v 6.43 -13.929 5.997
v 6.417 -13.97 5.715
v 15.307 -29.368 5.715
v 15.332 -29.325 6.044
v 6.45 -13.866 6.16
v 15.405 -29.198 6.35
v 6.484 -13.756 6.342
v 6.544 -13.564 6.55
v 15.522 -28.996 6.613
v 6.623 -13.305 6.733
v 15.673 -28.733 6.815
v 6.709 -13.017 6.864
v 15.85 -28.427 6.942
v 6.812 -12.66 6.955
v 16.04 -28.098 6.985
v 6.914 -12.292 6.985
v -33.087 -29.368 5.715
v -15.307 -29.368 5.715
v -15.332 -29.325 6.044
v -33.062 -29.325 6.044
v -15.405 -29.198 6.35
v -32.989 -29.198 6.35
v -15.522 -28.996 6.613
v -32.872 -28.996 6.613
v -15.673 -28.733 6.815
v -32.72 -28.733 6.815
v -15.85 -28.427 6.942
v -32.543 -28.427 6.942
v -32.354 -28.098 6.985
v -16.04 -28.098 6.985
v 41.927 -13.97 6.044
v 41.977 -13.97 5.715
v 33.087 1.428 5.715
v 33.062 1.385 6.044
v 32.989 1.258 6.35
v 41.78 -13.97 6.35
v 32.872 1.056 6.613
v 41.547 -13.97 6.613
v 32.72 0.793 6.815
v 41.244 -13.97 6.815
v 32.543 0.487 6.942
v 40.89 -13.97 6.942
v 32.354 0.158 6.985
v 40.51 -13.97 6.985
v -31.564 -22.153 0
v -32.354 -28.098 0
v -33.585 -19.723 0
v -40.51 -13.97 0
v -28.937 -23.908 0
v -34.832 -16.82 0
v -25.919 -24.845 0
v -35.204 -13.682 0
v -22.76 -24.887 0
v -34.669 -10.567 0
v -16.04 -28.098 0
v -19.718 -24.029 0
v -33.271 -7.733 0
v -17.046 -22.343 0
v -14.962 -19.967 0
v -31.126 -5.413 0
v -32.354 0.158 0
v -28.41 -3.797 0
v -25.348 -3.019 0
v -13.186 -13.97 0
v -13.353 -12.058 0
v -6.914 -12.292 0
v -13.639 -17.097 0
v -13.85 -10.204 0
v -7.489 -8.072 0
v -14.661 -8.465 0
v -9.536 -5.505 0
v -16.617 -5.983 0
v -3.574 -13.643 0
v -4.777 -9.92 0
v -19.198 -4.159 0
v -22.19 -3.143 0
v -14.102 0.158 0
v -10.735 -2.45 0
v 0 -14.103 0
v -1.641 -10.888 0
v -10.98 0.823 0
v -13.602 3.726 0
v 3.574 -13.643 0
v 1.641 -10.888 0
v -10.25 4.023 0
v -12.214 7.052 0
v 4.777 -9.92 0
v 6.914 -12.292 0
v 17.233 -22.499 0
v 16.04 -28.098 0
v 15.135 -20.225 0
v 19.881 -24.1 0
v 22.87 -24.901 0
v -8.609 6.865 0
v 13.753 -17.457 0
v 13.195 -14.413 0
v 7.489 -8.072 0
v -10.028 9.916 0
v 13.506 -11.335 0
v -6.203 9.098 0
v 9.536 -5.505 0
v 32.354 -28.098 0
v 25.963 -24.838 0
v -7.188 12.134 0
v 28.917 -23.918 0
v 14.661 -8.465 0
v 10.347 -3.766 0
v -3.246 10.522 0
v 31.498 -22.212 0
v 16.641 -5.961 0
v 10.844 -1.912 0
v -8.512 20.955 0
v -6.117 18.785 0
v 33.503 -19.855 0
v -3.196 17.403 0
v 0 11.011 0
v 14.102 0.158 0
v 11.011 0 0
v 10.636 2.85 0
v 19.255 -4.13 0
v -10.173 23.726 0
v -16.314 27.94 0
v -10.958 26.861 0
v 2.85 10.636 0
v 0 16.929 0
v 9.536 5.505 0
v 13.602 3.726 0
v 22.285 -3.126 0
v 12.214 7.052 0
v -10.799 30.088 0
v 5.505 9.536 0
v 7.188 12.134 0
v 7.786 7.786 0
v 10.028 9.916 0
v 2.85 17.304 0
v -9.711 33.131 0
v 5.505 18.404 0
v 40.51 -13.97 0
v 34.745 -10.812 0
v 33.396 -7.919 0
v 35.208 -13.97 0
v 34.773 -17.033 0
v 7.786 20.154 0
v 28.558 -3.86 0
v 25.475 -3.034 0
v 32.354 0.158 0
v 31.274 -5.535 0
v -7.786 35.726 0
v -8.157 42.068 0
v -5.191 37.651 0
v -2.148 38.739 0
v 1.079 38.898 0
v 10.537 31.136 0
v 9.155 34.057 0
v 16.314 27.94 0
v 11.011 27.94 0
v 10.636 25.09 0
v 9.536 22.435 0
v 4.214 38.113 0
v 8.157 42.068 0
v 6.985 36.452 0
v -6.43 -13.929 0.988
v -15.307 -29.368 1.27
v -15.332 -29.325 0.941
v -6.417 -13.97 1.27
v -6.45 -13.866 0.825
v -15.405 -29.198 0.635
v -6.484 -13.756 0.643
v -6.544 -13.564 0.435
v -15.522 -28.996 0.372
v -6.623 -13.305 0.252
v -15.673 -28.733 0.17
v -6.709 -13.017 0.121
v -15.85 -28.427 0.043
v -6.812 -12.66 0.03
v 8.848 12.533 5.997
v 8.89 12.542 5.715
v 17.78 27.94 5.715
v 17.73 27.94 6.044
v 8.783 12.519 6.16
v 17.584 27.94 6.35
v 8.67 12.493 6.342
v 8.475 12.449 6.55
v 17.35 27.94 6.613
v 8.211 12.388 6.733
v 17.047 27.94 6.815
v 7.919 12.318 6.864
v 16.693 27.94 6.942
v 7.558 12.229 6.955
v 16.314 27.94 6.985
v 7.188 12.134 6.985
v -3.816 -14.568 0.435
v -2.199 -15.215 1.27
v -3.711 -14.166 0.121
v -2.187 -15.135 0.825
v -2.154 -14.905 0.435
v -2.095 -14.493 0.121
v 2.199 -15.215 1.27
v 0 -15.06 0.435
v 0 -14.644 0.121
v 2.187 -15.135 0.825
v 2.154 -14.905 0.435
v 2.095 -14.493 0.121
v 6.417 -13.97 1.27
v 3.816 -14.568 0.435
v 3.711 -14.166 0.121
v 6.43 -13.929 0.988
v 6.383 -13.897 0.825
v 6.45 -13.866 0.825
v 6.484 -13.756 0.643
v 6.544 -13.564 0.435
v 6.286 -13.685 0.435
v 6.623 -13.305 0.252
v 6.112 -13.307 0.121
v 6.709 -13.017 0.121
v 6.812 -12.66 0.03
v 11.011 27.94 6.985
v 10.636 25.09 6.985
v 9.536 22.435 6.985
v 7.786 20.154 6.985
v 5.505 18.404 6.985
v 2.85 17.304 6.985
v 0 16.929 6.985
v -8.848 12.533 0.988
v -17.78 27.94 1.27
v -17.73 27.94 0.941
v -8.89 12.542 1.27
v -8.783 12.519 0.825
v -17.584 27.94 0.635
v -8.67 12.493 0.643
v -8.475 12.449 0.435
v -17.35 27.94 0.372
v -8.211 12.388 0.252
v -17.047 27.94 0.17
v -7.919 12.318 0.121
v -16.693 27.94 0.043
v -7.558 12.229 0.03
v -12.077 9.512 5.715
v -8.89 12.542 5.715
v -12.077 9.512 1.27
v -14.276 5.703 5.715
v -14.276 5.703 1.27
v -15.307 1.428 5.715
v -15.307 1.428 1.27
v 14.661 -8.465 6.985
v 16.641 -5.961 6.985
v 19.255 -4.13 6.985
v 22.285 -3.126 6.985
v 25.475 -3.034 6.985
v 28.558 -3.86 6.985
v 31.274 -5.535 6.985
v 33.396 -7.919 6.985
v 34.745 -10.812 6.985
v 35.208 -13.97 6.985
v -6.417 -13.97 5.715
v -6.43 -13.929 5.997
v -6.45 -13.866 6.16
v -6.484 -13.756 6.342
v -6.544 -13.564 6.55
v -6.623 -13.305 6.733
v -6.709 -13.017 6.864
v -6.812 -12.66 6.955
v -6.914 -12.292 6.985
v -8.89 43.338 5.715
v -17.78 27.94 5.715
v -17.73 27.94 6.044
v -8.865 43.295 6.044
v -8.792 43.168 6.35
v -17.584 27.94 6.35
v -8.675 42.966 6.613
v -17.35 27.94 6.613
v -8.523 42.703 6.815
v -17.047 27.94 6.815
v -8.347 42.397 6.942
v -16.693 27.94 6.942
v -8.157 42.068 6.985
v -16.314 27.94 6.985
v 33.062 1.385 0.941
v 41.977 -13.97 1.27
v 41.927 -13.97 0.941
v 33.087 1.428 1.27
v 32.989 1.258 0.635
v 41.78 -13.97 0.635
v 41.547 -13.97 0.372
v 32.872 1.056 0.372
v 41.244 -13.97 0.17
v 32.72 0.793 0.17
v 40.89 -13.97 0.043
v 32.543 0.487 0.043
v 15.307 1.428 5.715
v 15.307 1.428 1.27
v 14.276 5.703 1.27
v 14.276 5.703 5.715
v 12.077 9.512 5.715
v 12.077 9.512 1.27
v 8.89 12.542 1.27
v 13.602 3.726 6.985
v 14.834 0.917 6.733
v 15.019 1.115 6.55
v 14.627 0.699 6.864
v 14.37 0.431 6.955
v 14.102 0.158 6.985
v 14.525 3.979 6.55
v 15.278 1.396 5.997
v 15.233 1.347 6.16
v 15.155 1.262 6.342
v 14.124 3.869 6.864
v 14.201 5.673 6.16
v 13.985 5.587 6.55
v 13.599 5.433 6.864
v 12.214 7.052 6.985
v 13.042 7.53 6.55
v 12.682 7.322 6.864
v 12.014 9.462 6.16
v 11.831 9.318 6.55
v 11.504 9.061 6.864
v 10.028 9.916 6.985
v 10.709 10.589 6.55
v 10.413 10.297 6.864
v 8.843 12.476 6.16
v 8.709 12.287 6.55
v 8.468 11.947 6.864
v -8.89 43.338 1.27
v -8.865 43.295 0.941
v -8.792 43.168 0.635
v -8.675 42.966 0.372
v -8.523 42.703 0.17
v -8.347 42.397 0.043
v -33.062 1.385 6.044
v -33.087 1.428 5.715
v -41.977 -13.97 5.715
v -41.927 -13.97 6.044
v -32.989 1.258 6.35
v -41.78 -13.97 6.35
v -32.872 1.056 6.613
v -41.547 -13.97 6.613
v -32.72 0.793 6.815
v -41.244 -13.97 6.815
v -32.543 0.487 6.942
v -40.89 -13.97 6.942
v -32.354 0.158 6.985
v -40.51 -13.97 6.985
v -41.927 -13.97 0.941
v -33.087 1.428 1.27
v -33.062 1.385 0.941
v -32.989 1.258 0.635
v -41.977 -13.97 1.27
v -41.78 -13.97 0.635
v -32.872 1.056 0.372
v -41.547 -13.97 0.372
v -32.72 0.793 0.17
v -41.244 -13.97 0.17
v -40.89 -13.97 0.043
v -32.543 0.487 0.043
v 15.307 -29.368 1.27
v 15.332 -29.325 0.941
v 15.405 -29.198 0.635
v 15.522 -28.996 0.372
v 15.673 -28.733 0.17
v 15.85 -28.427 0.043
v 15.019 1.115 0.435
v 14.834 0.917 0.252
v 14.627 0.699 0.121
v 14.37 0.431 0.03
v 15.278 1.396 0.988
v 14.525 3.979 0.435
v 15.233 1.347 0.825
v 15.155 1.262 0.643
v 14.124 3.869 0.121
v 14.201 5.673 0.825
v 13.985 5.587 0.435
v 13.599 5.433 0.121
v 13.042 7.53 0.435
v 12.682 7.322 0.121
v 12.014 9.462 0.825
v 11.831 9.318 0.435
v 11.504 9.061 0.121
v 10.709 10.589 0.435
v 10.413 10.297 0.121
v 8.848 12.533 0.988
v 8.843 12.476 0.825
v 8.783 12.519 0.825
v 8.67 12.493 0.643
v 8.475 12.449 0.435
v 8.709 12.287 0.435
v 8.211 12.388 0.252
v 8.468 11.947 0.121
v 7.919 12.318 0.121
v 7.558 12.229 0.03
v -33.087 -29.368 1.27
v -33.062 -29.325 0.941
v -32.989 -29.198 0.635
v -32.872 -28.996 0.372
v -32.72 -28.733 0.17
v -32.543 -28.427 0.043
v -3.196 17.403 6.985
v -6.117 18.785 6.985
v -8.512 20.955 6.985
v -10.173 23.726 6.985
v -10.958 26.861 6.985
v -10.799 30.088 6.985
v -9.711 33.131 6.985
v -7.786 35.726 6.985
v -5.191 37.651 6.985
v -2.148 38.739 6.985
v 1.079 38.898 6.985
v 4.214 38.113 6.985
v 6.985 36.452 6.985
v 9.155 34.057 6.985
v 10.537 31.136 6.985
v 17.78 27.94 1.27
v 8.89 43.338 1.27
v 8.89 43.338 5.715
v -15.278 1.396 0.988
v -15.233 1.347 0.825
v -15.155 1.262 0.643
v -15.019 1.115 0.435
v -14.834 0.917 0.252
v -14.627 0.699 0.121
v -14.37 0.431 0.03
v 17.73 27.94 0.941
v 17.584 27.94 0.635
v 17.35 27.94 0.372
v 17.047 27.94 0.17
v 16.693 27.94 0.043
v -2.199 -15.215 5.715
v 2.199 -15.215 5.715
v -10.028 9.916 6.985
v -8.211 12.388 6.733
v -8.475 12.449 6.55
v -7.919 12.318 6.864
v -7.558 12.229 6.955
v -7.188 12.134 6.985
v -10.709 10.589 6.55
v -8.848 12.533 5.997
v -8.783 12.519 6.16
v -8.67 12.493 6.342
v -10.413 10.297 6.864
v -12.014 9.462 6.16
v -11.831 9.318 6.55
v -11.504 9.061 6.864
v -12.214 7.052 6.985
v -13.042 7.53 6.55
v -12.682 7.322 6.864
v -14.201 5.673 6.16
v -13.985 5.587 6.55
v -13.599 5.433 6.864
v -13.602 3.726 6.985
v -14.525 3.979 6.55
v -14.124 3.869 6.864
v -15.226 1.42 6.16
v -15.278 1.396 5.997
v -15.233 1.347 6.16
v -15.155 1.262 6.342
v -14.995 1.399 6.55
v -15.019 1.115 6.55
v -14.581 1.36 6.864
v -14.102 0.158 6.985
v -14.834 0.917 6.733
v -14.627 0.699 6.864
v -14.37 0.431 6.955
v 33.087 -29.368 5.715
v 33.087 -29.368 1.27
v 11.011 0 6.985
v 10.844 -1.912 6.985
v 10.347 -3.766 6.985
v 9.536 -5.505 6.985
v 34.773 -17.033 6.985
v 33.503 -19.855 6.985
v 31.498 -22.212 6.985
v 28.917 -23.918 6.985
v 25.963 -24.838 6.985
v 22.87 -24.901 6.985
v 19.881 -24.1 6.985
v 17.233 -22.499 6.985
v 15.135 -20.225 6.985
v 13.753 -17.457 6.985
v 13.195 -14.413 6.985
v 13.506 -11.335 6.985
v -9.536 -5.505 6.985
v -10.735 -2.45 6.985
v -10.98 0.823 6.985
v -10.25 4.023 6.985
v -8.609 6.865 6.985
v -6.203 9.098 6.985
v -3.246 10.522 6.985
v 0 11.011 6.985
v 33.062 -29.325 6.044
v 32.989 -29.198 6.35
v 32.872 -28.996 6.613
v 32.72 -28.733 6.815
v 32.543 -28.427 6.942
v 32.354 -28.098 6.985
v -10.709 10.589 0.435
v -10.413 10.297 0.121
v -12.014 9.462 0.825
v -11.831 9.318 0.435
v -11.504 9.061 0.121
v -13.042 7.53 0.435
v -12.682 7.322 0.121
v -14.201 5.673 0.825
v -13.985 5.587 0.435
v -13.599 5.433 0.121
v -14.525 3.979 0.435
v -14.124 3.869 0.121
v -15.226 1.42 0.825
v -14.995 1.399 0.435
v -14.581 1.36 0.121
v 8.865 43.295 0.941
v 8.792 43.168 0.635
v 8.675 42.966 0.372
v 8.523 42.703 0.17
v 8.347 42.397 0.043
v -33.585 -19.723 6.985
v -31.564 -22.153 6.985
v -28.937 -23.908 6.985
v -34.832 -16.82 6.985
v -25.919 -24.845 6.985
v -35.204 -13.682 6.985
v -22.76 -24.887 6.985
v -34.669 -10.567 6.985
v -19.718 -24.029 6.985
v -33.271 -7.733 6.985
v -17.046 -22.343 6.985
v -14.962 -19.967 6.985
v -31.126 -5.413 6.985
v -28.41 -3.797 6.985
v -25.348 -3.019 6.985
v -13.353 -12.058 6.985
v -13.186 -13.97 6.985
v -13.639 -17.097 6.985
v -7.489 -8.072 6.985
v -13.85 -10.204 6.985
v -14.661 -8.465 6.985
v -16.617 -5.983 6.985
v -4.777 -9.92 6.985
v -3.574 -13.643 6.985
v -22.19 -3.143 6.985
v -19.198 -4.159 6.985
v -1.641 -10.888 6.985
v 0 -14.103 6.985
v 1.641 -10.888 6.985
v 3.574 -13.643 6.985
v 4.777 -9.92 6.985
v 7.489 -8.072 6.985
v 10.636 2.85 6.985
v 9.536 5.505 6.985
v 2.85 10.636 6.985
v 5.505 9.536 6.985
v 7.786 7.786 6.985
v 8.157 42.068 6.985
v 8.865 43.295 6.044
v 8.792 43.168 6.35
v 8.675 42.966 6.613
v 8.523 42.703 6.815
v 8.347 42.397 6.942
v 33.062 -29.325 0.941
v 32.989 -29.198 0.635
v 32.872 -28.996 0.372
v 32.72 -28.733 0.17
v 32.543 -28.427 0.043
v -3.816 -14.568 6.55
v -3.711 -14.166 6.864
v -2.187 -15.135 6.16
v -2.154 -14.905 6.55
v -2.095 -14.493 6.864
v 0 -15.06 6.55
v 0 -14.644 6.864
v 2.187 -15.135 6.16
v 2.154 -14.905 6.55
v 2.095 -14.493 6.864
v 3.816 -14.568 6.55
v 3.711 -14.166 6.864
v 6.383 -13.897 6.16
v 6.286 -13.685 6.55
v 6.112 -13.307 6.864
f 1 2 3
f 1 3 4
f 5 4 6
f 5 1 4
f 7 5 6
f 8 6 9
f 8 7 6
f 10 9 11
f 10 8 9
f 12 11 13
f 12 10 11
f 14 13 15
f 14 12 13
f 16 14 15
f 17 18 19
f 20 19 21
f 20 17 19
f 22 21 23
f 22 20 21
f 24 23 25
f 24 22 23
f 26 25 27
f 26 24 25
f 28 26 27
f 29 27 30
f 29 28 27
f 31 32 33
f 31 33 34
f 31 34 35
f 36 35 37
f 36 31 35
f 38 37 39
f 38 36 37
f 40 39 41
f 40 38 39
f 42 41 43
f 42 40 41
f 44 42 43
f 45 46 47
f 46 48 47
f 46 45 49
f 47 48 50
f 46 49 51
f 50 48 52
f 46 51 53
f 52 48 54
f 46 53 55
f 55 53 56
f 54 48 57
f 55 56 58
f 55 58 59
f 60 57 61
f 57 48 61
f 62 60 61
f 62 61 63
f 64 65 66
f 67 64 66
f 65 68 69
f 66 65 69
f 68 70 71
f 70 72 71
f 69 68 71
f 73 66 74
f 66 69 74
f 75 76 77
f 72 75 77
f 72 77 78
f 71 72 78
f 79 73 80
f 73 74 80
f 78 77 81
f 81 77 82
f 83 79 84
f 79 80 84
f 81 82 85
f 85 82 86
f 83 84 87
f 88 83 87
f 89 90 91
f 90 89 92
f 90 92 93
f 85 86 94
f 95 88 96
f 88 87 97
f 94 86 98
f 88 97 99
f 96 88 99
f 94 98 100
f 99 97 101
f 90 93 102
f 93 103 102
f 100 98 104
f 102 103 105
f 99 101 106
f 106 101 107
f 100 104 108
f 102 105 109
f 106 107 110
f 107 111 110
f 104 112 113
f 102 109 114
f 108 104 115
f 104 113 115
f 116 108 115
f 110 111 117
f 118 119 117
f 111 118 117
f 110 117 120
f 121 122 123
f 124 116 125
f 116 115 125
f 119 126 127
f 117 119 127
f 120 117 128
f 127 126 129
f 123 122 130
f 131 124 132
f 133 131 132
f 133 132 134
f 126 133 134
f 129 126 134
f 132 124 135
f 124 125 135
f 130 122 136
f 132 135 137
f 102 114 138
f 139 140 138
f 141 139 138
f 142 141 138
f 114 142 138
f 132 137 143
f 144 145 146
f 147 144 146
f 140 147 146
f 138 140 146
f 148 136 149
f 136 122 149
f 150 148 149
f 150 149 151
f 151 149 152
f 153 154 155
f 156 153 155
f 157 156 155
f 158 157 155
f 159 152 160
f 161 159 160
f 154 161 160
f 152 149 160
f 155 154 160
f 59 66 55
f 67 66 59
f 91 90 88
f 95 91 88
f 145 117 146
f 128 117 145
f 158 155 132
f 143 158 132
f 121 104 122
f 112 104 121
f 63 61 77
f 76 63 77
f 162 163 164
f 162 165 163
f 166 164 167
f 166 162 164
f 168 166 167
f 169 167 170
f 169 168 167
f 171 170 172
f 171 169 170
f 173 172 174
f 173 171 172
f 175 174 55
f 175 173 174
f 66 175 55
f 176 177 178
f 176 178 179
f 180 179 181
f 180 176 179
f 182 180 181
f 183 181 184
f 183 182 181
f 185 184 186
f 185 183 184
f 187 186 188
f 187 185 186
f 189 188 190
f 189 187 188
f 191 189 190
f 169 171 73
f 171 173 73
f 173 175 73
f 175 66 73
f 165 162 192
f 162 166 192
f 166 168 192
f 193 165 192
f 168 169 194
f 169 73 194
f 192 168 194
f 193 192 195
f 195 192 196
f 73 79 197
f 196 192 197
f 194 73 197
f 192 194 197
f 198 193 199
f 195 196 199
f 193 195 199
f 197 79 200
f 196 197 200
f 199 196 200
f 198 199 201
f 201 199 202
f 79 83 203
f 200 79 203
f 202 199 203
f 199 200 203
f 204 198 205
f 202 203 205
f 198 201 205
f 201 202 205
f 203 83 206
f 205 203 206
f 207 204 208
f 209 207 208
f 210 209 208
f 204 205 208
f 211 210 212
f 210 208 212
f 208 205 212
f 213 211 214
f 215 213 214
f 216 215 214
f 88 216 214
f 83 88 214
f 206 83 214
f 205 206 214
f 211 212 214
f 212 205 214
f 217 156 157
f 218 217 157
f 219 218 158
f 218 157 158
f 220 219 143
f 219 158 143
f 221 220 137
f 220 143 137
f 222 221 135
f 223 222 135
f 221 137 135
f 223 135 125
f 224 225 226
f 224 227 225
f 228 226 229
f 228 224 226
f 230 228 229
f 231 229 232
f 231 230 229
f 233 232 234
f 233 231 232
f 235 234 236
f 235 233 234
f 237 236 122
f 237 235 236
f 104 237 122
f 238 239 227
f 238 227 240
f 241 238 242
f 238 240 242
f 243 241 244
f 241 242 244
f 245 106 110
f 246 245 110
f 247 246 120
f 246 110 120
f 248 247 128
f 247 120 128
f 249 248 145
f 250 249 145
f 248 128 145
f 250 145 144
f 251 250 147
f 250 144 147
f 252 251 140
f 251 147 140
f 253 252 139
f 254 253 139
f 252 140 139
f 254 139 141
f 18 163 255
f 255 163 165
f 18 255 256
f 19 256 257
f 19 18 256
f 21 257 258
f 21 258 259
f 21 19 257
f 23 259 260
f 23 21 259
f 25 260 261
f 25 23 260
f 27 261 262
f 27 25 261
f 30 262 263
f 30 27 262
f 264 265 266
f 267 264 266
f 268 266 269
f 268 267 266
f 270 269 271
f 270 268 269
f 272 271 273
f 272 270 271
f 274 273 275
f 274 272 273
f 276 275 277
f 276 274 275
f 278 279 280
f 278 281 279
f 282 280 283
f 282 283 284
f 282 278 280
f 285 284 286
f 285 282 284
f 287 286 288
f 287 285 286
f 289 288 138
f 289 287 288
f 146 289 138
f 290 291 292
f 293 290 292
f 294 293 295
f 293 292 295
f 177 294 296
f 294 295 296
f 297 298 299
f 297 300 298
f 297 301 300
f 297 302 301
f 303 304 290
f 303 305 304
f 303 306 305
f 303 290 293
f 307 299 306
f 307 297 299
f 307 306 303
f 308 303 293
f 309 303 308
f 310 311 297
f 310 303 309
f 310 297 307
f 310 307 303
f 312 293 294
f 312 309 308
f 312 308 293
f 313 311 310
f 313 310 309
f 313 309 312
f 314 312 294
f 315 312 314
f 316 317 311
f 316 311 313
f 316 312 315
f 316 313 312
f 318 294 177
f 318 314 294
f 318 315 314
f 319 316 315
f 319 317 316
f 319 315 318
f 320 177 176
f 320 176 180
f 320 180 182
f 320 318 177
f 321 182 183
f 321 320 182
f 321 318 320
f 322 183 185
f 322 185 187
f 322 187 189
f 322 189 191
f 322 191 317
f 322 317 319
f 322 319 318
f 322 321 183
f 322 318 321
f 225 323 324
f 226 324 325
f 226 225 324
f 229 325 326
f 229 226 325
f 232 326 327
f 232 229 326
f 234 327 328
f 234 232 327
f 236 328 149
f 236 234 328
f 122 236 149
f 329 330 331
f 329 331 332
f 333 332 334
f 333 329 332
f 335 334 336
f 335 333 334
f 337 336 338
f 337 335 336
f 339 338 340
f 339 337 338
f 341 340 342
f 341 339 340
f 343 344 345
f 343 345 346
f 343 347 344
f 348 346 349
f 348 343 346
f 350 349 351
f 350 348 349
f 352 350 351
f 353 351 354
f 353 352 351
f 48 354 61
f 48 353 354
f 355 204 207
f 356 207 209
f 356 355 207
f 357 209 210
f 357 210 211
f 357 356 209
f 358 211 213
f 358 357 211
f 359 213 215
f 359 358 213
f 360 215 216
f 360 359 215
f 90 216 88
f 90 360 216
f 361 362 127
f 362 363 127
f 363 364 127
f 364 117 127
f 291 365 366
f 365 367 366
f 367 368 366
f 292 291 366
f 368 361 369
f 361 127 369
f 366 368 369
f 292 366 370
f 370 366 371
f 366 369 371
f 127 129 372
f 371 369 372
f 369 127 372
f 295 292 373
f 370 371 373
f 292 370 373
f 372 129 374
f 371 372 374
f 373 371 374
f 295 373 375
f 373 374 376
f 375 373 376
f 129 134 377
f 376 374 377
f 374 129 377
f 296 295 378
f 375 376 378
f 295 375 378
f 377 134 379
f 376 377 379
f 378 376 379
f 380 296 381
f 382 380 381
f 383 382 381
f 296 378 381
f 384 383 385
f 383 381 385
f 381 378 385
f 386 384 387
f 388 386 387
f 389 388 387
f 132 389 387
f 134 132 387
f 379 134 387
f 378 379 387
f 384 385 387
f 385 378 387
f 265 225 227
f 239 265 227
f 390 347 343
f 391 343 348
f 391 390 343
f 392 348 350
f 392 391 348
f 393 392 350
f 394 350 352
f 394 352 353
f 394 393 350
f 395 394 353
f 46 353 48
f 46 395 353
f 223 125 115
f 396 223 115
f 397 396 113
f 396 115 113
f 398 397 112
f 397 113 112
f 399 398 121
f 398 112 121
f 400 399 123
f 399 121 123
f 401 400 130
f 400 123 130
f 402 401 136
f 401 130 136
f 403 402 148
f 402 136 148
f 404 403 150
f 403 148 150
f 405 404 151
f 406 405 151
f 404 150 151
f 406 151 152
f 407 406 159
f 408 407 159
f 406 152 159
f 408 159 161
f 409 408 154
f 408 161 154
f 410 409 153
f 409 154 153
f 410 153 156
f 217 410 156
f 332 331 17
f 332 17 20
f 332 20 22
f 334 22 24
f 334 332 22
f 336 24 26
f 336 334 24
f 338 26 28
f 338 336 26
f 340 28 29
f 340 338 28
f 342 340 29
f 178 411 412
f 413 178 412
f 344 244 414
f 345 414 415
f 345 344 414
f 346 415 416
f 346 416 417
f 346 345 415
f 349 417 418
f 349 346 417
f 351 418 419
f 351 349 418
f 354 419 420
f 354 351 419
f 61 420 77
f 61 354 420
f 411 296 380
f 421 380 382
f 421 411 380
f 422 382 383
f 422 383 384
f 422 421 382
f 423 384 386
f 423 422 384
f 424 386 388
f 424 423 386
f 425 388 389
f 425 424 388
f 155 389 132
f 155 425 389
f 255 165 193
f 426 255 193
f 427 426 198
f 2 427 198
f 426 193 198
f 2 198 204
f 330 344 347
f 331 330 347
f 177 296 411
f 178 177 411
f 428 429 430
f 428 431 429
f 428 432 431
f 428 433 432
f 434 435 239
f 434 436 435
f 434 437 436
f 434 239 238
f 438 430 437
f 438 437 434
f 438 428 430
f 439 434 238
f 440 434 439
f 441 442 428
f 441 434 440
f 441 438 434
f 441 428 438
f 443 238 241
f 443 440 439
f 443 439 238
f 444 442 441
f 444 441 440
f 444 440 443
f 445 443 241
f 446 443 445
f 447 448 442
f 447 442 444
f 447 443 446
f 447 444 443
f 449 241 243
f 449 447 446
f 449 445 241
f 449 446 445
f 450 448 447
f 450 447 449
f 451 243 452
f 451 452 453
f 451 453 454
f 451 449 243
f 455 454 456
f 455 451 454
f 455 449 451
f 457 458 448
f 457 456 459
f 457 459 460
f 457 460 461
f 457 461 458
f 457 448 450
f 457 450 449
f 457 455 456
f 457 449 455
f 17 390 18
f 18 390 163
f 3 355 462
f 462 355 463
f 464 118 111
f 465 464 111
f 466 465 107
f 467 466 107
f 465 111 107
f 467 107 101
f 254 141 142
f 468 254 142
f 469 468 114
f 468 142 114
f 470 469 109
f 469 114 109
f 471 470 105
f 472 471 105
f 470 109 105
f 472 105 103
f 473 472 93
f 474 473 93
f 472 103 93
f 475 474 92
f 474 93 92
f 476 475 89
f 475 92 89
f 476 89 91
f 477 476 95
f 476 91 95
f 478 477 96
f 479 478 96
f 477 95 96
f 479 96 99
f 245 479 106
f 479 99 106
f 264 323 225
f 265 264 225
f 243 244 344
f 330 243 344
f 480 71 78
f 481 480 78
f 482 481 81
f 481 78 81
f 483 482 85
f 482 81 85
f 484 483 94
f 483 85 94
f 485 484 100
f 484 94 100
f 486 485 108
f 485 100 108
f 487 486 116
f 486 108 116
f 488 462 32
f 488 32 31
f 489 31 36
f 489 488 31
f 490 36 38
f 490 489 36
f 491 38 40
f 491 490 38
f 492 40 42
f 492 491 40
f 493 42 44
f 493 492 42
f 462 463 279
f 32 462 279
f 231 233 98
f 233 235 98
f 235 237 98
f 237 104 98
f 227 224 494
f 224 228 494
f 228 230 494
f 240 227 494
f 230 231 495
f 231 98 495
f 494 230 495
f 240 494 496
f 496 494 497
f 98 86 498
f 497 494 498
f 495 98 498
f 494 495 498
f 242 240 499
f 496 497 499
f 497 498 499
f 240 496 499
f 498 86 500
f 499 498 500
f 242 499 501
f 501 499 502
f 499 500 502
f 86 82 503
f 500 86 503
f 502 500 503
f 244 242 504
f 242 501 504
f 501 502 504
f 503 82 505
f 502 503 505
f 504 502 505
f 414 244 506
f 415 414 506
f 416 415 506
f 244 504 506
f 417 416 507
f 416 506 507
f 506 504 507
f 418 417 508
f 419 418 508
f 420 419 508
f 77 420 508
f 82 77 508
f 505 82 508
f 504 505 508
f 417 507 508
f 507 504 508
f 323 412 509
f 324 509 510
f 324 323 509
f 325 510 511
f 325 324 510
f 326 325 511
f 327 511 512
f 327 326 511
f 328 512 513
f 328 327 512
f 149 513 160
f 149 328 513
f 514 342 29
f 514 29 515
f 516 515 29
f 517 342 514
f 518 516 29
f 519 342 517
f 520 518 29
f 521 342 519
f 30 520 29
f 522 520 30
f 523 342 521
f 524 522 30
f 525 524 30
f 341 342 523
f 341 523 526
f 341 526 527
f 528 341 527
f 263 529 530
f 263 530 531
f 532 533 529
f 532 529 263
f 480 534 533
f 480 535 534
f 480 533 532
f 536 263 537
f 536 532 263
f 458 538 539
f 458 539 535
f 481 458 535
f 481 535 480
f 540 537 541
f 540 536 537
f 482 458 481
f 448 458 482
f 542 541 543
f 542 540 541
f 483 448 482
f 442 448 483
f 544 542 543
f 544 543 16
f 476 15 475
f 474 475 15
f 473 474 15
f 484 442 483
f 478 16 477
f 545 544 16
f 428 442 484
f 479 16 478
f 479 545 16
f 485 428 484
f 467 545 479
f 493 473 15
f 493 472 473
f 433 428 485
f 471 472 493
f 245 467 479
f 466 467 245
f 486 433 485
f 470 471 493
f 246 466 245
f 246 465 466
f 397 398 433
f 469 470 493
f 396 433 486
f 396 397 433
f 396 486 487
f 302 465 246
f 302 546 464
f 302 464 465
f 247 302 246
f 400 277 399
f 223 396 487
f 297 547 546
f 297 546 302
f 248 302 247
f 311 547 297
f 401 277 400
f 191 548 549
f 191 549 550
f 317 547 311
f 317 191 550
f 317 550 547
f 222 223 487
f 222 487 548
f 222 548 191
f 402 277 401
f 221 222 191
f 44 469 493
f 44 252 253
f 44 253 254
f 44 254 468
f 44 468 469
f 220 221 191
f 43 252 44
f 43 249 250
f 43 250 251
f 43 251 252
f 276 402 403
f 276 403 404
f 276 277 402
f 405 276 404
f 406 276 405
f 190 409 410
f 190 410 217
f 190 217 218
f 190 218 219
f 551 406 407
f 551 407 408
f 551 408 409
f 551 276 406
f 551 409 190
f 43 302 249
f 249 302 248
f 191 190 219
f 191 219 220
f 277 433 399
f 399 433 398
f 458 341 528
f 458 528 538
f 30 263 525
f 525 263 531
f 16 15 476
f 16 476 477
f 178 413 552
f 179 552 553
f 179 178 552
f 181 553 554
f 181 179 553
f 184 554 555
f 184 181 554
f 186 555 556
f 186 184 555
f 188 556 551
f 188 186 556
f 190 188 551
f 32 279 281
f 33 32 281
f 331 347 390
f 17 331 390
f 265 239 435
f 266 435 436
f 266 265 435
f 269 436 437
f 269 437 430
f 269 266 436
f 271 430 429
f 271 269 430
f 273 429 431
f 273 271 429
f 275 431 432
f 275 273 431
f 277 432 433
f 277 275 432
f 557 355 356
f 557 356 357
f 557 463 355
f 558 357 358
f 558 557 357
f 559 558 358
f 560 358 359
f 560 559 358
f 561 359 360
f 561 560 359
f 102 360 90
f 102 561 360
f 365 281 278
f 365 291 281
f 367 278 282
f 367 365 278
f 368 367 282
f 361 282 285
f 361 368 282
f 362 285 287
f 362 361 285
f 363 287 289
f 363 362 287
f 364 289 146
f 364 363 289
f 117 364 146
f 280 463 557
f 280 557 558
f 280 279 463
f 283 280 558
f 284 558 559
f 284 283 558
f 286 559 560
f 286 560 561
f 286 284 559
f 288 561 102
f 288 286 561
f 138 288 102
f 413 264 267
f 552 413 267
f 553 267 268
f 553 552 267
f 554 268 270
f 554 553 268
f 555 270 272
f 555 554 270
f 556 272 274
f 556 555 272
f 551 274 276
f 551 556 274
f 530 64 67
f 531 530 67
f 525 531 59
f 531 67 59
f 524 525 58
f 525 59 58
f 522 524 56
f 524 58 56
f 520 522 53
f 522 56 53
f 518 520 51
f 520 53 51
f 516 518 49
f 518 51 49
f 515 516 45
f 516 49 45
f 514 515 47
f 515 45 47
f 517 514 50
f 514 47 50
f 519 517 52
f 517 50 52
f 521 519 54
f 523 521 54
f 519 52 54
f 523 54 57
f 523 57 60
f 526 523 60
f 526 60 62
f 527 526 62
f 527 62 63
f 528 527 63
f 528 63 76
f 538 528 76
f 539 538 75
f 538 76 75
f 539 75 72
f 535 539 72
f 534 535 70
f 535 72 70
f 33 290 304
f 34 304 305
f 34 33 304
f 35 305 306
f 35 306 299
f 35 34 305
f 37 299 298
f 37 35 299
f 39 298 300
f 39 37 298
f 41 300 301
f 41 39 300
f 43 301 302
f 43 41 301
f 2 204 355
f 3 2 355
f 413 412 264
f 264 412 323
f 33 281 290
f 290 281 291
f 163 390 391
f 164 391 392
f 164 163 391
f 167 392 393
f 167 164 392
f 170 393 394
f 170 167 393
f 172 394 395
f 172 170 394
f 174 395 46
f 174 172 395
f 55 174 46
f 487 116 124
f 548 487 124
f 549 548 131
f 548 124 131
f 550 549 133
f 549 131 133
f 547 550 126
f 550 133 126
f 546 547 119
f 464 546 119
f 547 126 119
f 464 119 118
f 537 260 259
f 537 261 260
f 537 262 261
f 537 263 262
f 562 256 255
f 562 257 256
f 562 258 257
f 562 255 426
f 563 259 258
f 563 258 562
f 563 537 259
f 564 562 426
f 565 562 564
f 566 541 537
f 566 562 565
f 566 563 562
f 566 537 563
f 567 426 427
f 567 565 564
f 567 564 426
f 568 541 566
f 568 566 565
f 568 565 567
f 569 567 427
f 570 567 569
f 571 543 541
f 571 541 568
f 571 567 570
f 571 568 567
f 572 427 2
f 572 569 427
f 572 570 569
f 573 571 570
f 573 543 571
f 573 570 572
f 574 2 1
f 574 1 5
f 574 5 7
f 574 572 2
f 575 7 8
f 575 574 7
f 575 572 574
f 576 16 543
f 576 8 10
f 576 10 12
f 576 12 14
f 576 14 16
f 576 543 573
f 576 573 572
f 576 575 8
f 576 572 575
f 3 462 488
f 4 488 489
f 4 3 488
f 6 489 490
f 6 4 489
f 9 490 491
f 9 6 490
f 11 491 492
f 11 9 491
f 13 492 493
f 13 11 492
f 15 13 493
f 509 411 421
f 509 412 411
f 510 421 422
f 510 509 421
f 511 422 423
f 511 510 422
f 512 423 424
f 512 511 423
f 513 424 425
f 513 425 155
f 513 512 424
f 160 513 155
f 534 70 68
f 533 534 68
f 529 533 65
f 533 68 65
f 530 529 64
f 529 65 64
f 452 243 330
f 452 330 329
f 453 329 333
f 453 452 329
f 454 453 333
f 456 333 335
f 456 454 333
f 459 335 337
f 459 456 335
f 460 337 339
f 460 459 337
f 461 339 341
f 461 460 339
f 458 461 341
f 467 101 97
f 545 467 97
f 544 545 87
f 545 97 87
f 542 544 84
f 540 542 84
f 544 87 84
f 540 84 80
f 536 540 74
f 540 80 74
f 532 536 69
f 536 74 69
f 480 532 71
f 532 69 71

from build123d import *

# Parameters (mm, degrees)
F1_DEPTH      = 6.985
F2_T3_DEPTH   = 24.13
F2_S4_R       = 15.3732097417
F2_T5_DEPTH   = 14
F2_T8_DEPTH   = 24.13
F2_T11_DEPTH  = 24.13
F2_T14_DEPTH  = 24.13
F2_T17_DEPTH  = 24.13
F2_S18_R      = 15.3732097417
F2_T19_DEPTH  = 14
F2_T22_ANGLE  = 73.0101001262
F2_T27_ANGLE  = 73.0101001262
F2_T32_DEPTH  = 24.13
F2_S33_R      = 15.3732097417
F2_T34_DEPTH  = 14
F2_T37_DEPTH  = 24.13
F2_T40_DEPTH  = 24.13
F2_T43_DEPTH  = 24.13
F2_T46_ANGLE  = 73.0101001262
F2_T51_DEPTH  = 24.13
F2_S52_R      = 15.3732097417
F2_T53_DEPTH  = 14
F2_T56_DEPTH  = 24.13
F2_T59_DEPTH  = 24.13
F2_T62_DEPTH  = 24.13
F2_T65_DEPTH  = 24.13
F2_S66_R      = 15.3732097417
F2_T67_DEPTH  = 14
F2_T70_DEPTH  = 24.13
F2_S71_R      = 15.3732097417
F2_T72_DEPTH  = 14
F2_T76_DEPTH  = 24.13
F2_S77_R      = 15.3732097417
F2_T78_DEPTH  = 14
F2_T81_ANGLE  = 73.0101001262
F2_T87_DEPTH  = 24.13
F2_S88_R      = 15.3732097417
F2_T89_DEPTH  = 14
F2_T92_ANGLE  = 73.0101001262
F2_T98_DEPTH  = 24.13
F2_S99_R      = 15.3732097417
F2_T100_DEPTH = 14
F2_T103_ANGLE = 73.0101001262
F2_T109_ANGLE = 73.0101001262
F2_T113_DEPTH = 24.13
F2_S114_R     = 15.3732097417
F2_T115_DEPTH = 14
F2_T120_DEPTH = 24.13
F2_S121_R     = 15.3732097417
F2_T122_DEPTH = 14
F2_T125_ANGLE = 73.0101001262
F2_T131_ANGLE = 73.0101001262
F2_T135_DEPTH = 24.13
F2_S136_R     = 15.3732097417
F2_T137_DEPTH = 14
F3_R          = 1.27


# Not quite as in the source:
# - a fillet or chamfer that OpenCascade refuses, or shapes differently, is made with other operations: its cross-section is extruded or revolved along the edge and cut away or added


with BuildPart() as f1:
    # F0 (on Top) → F1 (new body)
    with BuildSketch(Plane.XY):
        with BuildLine():
            ThreePointArc((0, 11.0109), (7.785882057, 7.785882057), (11.0109, 0))
            ThreePointArc((11.0109, 0), (10.6357126807, -2.8498306237), (9.5357191185, -5.50545))
            Line((9.5357191185, -5.50545), (10.8617497817, -6.2710341604))
            Line((10.8617497817, -6.2710341604), (15.3067497817, 1.4279316793))
            ThreePointArc((15.3067497817, 1.4279316793), (13.313590174, 7.6866048708), (8.89, 12.5420683207))
            Line((8.89, 12.5420683207), (0, 12.5420683207))
            Line((0, 12.5420683207), (0, 11.0109))
        make_face()
        with BuildLine():
            ThreePointArc((-9.5357191185, -5.50545), (-9.5357191185, 5.50545), (0, 11.0109))
            Line((0, 11.0109), (0, 12.5420683207))
            Line((0, 12.5420683207), (-8.89, 12.5420683207))
            ThreePointArc((-8.89, 12.5420683207), (-13.313590174, 7.6866048708), (-15.3067497817, 1.4279316793))
            Line((-15.3067497817, 1.4279316793), (-10.8617497817, -6.2710341604))
            Line((-10.8617497817, -6.2710341604), (-9.5357191185, -5.50545))
        make_face()
        with BuildLine():
            Line((10.8617497817, -6.2710341604), (9.5357191185, -5.50545))
            ThreePointArc((9.5357191185, -5.50545), (0, -11.0109), (-9.5357191185, -5.50545))
            Line((-9.5357191185, -5.50545), (-10.8617497817, -6.2710341604))
            Line((-10.8617497817, -6.2710341604), (-6.4167497817, -13.97))
            ThreePointArc((-6.4167497817, -13.97), (0, -15.3732097417), (6.4167497817, -13.97))
            Line((6.4167497817, -13.97), (10.8617497817, -6.2710341604))
        make_face()
        with BuildLine():
            Line((-8.89, 12.5420683207), (0, 12.5420683207))
            Line((0, 12.5420683207), (0, 15.3732097417))
            ThreePointArc((0, 15.3732097417), (-4.6649614614, 14.648334797), (-8.89, 12.5420683207))
        make_face()
        with BuildLine():
            Line((0, 15.3732097417), (0, 12.5420683207))
            Line((0, 12.5420683207), (8.89, 12.5420683207))
            ThreePointArc((8.89, 12.5420683207), (4.6649614614, 14.648334797), (0, 15.3732097417))
        make_face()
        with BuildLine():
            Line((15.3067497817, 1.4279316793), (10.8617497817, -6.2710341604))
            Line((10.8617497817, -6.2710341604), (13.313590174, -7.6866048708))
            ThreePointArc((13.313590174, -7.6866048708), (14.8493803224, -3.9788794655), (15.3732097417, 0))
            ThreePointArc((15.3732097417, 0), (15.3565857634, 0.7147387297), (15.3067497817, 1.4279316793))
        make_face()
        with BuildLine():
            Line((13.313590174, -7.6866048708), (10.8617497817, -6.2710341604))
            Line((10.8617497817, -6.2710341604), (6.4167497817, -13.97))
            ThreePointArc((6.4167497817, -13.97), (10.3533493266, -11.3641425318), (13.313590174, -7.6866048708))
        make_face()
        with BuildLine():
            Line((-6.4167497817, -13.97), (-10.8617497817, -6.2710341604))
            Line((-10.8617497817, -6.2710341604), (-13.313590174, -7.6866048708))
            ThreePointArc((-13.313590174, -7.6866048708), (-10.3533493266, -11.3641425318), (-6.4167497817, -13.97))
        make_face()
        with BuildLine():
            Line((-13.313590174, -7.6866048708), (-10.8617497817, -6.2710341604))
            Line((-10.8617497817, -6.2710341604), (-15.3067497817, 1.4279316793))
            ThreePointArc((-15.3067497817, 1.4279316793), (-15.018310788, -3.2841922653), (-13.313590174, -7.6866048708))
        make_face()
        with BuildLine():
            ThreePointArc((-8.89, 12.5420683207), (-4.6649614614, 14.648334797), (0, 15.3732097417))
            ThreePointArc((0, 15.3732097417), (4.6649614614, 14.648334797), (8.89, 12.5420683207))
            Line((8.89, 12.5420683207), (17.78, 27.94))
            Line((17.78, 27.94), (8.89, 43.3379316793))
            Line((8.89, 43.3379316793), (-8.89, 43.3379316793))
            Line((-8.89, 43.3379316793), (-17.78, 27.94))
            Line((-17.78, 27.94), (-8.89, 12.5420683207))
        make_face()
        with BuildLine():
            ThreePointArc((11.0109, 27.94), (7.785882057, 20.154117943), (0, 16.9291))
            ThreePointArc((0, 16.9291), (-7.785882057, 35.725882057), (11.0109, 27.94))
        make_face(mode=Mode.SUBTRACT)
        with BuildLine():
            ThreePointArc((15.3732097417, 0), (14.8493803224, -3.9788794655), (13.313590174, -7.6866048708))
            ThreePointArc((13.313590174, -7.6866048708), (10.3533493266, -11.3641425318), (6.4167497817, -13.97))
            Line((6.4167497817, -13.97), (15.3067497817, -29.3679316793))
            Line((15.3067497817, -29.3679316793), (33.0867497817, -29.3679316793))
            Line((33.0867497817, -29.3679316793), (41.9767497817, -13.97))
            Line((41.9767497817, -13.97), (33.0867497817, 1.4279316793))
            Line((33.0867497817, 1.4279316793), (15.3067497817, 1.4279316793))
            ThreePointArc((15.3067497817, 1.4279316793), (15.3565857634, 0.7147387297), (15.3732097417, 0))
        make_face()
        with BuildLine():
            ThreePointArc((35.2076497817, -13.97), (21.346919158, -24.6057126807), (14.6610306632, -8.46455))
            ThreePointArc((14.6610306632, -8.46455), (27.0465804055, -3.3342873193), (35.2076497817, -13.97))
        make_face(mode=Mode.SUBTRACT)
        with BuildLine():
            ThreePointArc((-6.4167497817, -13.97), (-10.3533493266, -11.3641425318), (-13.313590174, -7.6866048708))
            ThreePointArc((-13.313590174, -7.6866048708), (-15.018310788, -3.2841922653), (-15.3067497817, 1.4279316793))
            Line((-15.3067497817, 1.4279316793), (-33.0867497817, 1.4279316793))
            Line((-33.0867497817, 1.4279316793), (-41.9767497817, -13.97))
            Line((-41.9767497817, -13.97), (-33.0867497817, -29.3679316793))
            Line((-33.0867497817, -29.3679316793), (-15.3067497817, -29.3679316793))
            Line((-15.3067497817, -29.3679316793), (-6.4167497817, -13.97))
        make_face()
        with BuildLine():
            ThreePointArc((-13.1858497817, -13.97), (-34.8324624624, -16.8198306237), (-14.6610306632, -8.46455))
            ThreePointArc((-14.6610306632, -8.46455), (-13.5610371011, -11.1201693763), (-13.1858497817, -13.97))
        make_face(mode=Mode.SUBTRACT)
    extrude(amount=F1_DEPTH)

    # F2: fillet of radius 1.27 on 18 edges, made by hand


with BuildPart() as f2_tool1:
    # F2_s2 → F2_t3 (new body)
    with BuildSketch(Plane(origin=(-18.1308748909, 31.4035964967, 0), x_dir=(0, 0, 1), z_dir=(0.5, -0.8660254038, 0))):
        with BuildLine():
            ThreePointArc((5.715, 1.4279316793), (6.6130256121, 1.0559572914), (6.985, 0.1579316793))
            Line((6.985, 0.1579316793), (6.985, 1.4279316793))
            Line((6.985, 1.4279316793), (5.715, 1.4279316793))
        make_face()
    extrude(amount=F2_T3_DEPTH)

    # F2_s4 → F2_t5 (cut, symmetric)
    with BuildSketch(Plane.XY.offset(6.4)):
        Circle(F2_S4_R)
    extrude(amount=F2_T5_DEPTH, both=True, mode=Mode.SUBTRACT)


with BuildPart() as f2_tool6:
    # F2_s7 → F2_t8 (new body)
    with BuildSketch(Plane(origin=(18.1308748909, 31.4035964967, 0), x_dir=(0, 0, 1), z_dir=(-0.5, -0.8660254038, 0))):
        with BuildLine():
            ThreePointArc((5.715, 29.3679316793), (6.6130256121, 28.9959572914), (6.985, 28.0979316793))
            Line((6.985, 28.0979316793), (6.985, 29.3679316793))
            Line((6.985, 29.3679316793), (5.715, 29.3679316793))
        make_face()
    extrude(amount=F2_T8_DEPTH)


with BuildPart() as f2_tool9:
    # F2_s10 → F2_t11 (new body)
    with BuildSketch(Plane.YZ.offset(12.065)):
        with BuildLine():
            ThreePointArc((43.3379316793, 5.715), (42.9659572914, 6.6130256121), (42.0679316793, 6.985))
            Line((42.0679316793, 6.985), (43.3379316793, 6.985))
            Line((43.3379316793, 6.985), (43.3379316793, 5.715))
        make_face()
    extrude(amount=-F2_T11_DEPTH)


with BuildPart() as f2_tool12:
    # F2_s13 → F2_t14 (new body)
    with BuildSketch(Plane(origin=(-6.0658748909, 10.5064035033, 0), x_dir=(0, 0, 1), z_dir=(-0.5, 0.8660254038, 0))):
        with BuildLine():
            ThreePointArc((5.715, 29.3679316793), (6.6130256121, 28.9959572914), (6.985, 28.0979316793))
            Line((6.985, 28.0979316793), (6.985, 29.3679316793))
            Line((6.985, 29.3679316793), (5.715, 29.3679316793))
        make_face()
    extrude(amount=F2_T14_DEPTH)


with BuildPart() as f2_tool15:
    # F2_s16 → F2_t17 (new body)
    with BuildSketch(Plane(origin=(6.0658748909, 10.5064035033, 0), x_dir=(0, 0, 1), z_dir=(0.5, 0.8660254038, 0))):
        with BuildLine():
            ThreePointArc((5.715, 1.4279316793), (6.6130256121, 1.0559572914), (6.985, 0.1579316793))
            Line((6.985, 0.1579316793), (6.985, 1.4279316793))
            Line((6.985, 1.4279316793), (5.715, 1.4279316793))
        make_face()
    extrude(amount=F2_T17_DEPTH)

    # F2_s18 → F2_t19 (cut, symmetric)
    with BuildSketch(Plane.XY.offset(6.4)):
        Circle(F2_S18_R)
    extrude(amount=F2_T19_DEPTH, both=True, mode=Mode.SUBTRACT)


with BuildPart() as f2_tool20:
    # F2_s21 → F2_t22 (revolve)
    with BuildSketch(Plane(origin=(0, 0, 0), x_dir=(0, 0, 1), z_dir=(-0.113290787, -0.9935618741, 0))):
        with BuildLine():
            ThreePointArc((5.715, -15.3732097417), (6.6130256121, -15.0012353538), (6.985, -14.1032097417))
            Line((6.985, -14.1032097417), (6.985, -15.3732097417))
            Line((6.985, -15.3732097417), (5.715, -15.3732097417))
        make_face()
    revolve(axis=Axis((0, 0, 6.985), (0, 0, 1)), revolution_arc=F2_T22_ANGLE)

    split(bisect_by=Plane(origin=(1.2366251091, -0.7139658396, 0), x_dir=(0, 0, 1), z_dir=(0.8660254038, -0.5, 0)), keep=Keep.TOP)

    split(bisect_by=Plane.XZ.offset(-1.4279316793), keep=Keep.BOTTOM)


with BuildPart() as f2_tool25:
    # F2_s26 → F2_t27 (revolve)
    with BuildSketch(Plane(origin=(0, 0, 0), x_dir=(0, 0, 1), z_dir=(0.9170952167, 0.3986682375, 0))):
        with BuildLine():
            ThreePointArc((5.715, -15.3732097417), (6.6130256121, -15.0012353538), (6.985, -14.1032097417))
            Line((6.985, -14.1032097417), (6.985, -15.3732097417))
            Line((6.985, -15.3732097417), (5.715, -15.3732097417))
        make_face()
    revolve(axis=Axis((0, 0, 6.985), (0, 0, 1)), revolution_arc=F2_T27_ANGLE)

    split(bisect_by=Plane(origin=(-1.2366251091, -0.7139658396, 0), x_dir=(0, 0, 1), z_dir=(-0.8660254038, -0.5, 0)), keep=Keep.TOP)

    split(bisect_by=Plane.XZ.offset(-1.4279316793), keep=Keep.BOTTOM)


with BuildPart() as f2_tool30:
    # F2_s31 → F2_t32 (new body)
    with BuildSketch(Plane.YZ.offset(-12.1317497817)):
        with BuildLine():
            ThreePointArc((1.4279316793, 5.715), (1.0559572914, 6.6130256121), (0.1579316793, 6.985))
            Line((0.1579316793, 6.985), (1.4279316793, 6.985))
            Line((1.4279316793, 6.985), (1.4279316793, 5.715))
        make_face()
    extrude(amount=-F2_T32_DEPTH)

    # F2_s33 → F2_t34 (cut, symmetric)
    with BuildSketch(Plane.XY.offset(6.4)):
        Circle(F2_S33_R)
    extrude(amount=F2_T34_DEPTH, both=True, mode=Mode.SUBTRACT)


with BuildPart() as f2_tool35:
    # F2_s36 → F2_t37 (new body)
    with BuildSketch(Plane(origin=(-6.0658748909, -10.5064035033, 0), x_dir=(0, 0, 1), z_dir=(-0.5, -0.8660254038, 0))):
        with BuildLine():
            ThreePointArc((5.715, 29.3679316793), (6.6130256121, 28.9959572914), (6.985, 28.0979316793))
            Line((6.985, 28.0979316793), (6.985, 29.3679316793))
            Line((6.985, 29.3679316793), (5.715, 29.3679316793))
        make_face()
    extrude(amount=F2_T37_DEPTH)


with BuildPart() as f2_tool38:
    # F2_s39 → F2_t40 (new body)
    with BuildSketch(Plane(origin=(-6.0325, 10.4485964967, 0), x_dir=(0, 0, 1), z_dir=(0.5, -0.8660254038, 0))):
        with BuildLine():
            ThreePointArc((5.715, 43.3379316793), (6.6130256121, 42.9659572914), (6.985, 42.0679316793))
            Line((6.985, 42.0679316793), (6.985, 43.3379316793))
            Line((6.985, 43.3379316793), (5.715, 43.3379316793))
        make_face()
    extrude(amount=F2_T40_DEPTH)


with BuildPart() as f2_tool41:
    # F2_s42 → F2_t43 (new body)
    with BuildSketch(Plane.YZ.offset(-36.2617497817)):
        with BuildLine():
            ThreePointArc((-29.3679316793, 5.715), (-28.9959572914, 6.6130256121), (-28.0979316793, 6.985))
            Line((-28.0979316793, 6.985), (-29.3679316793, 6.985))
            Line((-29.3679316793, 6.985), (-29.3679316793, 5.715))
        make_face()
    extrude(amount=F2_T43_DEPTH)


with BuildPart() as f2_tool44:
    # F2_s45 → F2_t46 (revolve)
    with BuildSketch(Plane(origin=(0, 0, 0), x_dir=(0, 0, 1), z_dir=(-0.8038044297, 0.5948936366, 0))):
        with BuildLine():
            ThreePointArc((5.715, -15.3732097417), (6.6130256121, -15.0012353538), (6.985, -14.1032097417))
            Line((6.985, -14.1032097417), (6.985, -15.3732097417))
            Line((6.985, -15.3732097417), (5.715, -15.3732097417))
        make_face()
    revolve(axis=Axis((0, 0, 6.985), (0, 0, 1)), revolution_arc=F2_T46_ANGLE)

    split(bisect_by=Plane(origin=(1.2366251091, -0.7139658396, 0), x_dir=(0, 0, 1), z_dir=(0.8660254038, -0.5, 0)), keep=Keep.TOP)

    split(bisect_by=Plane(origin=(-1.2366251091, -0.7139658396, 0), x_dir=(0, 0, 1), z_dir=(-0.8660254038, -0.5, 0)), keep=Keep.TOP)


with BuildPart() as f2_tool49:
    # F2_s50 → F2_t51 (new body)
    with BuildSketch(Plane(origin=(6.0658748909, -10.5064035033, 0), x_dir=(0, 0, 1), z_dir=(0.5, -0.8660254038, 0))):
        with BuildLine():
            ThreePointArc((5.715, 1.4279316793), (6.6130256121, 1.0559572914), (6.985, 0.1579316793))
            Line((6.985, 0.1579316793), (6.985, 1.4279316793))
            Line((6.985, 1.4279316793), (5.715, 1.4279316793))
        make_face()
    extrude(amount=F2_T51_DEPTH)

    # F2_s52 → F2_t53 (cut, symmetric)
    with BuildSketch(Plane.XY.offset(6.4)):
        Circle(F2_S52_R)
    extrude(amount=F2_T53_DEPTH, both=True, mode=Mode.SUBTRACT)


with BuildPart() as f2_tool54:
    # F2_s55 → F2_t56 (new body)
    with BuildSketch(Plane.YZ.offset(12.1317497817)):
        with BuildLine():
            ThreePointArc((-29.3679316793, 5.715), (-28.9959572914, 6.6130256121), (-28.0979316793, 6.985))
            Line((-28.0979316793, 6.985), (-29.3679316793, 6.985))
            Line((-29.3679316793, 6.985), (-29.3679316793, 5.715))
        make_face()
    extrude(amount=F2_T56_DEPTH)


with BuildPart() as f2_tool57:
    # F2_s58 → F2_t59 (new body)
    with BuildSketch(Plane(origin=(-6.0325, -10.4485964967, 0), x_dir=(0, 0, 1), z_dir=(0.5, 0.8660254038, 0))):
        with BuildLine():
            ThreePointArc((5.715, 43.3379316793), (6.6130256121, 42.9659572914), (6.985, 42.0679316793))
            Line((6.985, 42.0679316793), (6.985, 43.3379316793))
            Line((6.985, 43.3379316793), (5.715, 43.3379316793))
        make_face()
    extrude(amount=F2_T59_DEPTH)


with BuildPart() as f2_tool60:
    # F2_s61 → F2_t62 (new body)
    with BuildSketch(Plane(origin=(18.1308748909, -31.4035964967, 0), x_dir=(0, 0, 1), z_dir=(-0.5, 0.8660254038, 0))):
        with BuildLine():
            ThreePointArc((5.715, 29.3679316793), (6.6130256121, 28.9959572914), (6.985, 28.0979316793))
            Line((6.985, 28.0979316793), (6.985, 29.3679316793))
            Line((6.985, 29.3679316793), (5.715, 29.3679316793))
        make_face()
    extrude(amount=F2_T62_DEPTH)


with BuildPart() as f2_tool63:
    # F2_s64 → F2_t65 (new body)
    with BuildSketch(Plane.YZ.offset(36.2617497817)):
        with BuildLine():
            ThreePointArc((1.4279316793, 5.715), (1.0559572914, 6.6130256121), (0.1579316793, 6.985))
            Line((0.1579316793, 6.985), (1.4279316793, 6.985))
            Line((1.4279316793, 6.985), (1.4279316793, 5.715))
        make_face()
    extrude(amount=-F2_T65_DEPTH)

    # F2_s66 → F2_t67 (cut, symmetric)
    with BuildSketch(Plane.XY.offset(6.4)):
        Circle(F2_S66_R)
    extrude(amount=F2_T67_DEPTH, both=True, mode=Mode.SUBTRACT)


with BuildPart() as f2_tool68:
    # F2_s69 → F2_t70 (new body)
    with BuildSketch(Plane(origin=(-18.1308748909, -31.4035964967, 0), x_dir=(0, 0, 1), z_dir=(0.5, 0.8660254038, 0))):
        with BuildLine():
            ThreePointArc((5.715, 1.4279316793), (6.6130256121, 1.0559572914), (6.985, 0.1579316793))
            Line((6.985, 0.1579316793), (6.985, 1.4279316793))
            Line((6.985, 1.4279316793), (5.715, 1.4279316793))
        make_face()
    extrude(amount=F2_T70_DEPTH)

    # F2_s71 → F2_t72 (cut, symmetric)
    with BuildSketch(Plane.XY.offset(6.4)):
        Circle(F2_S71_R)
    extrude(amount=F2_T72_DEPTH, both=True, mode=Mode.SUBTRACT)


with BuildPart() as f2_tool74:
    # F2_s75 → F2_t76 (new body)
    with BuildSketch(Plane(origin=(-18.1308748909, 31.4035964967, 0), x_dir=(0, 0, 1), z_dir=(0.5, -0.8660254038, 0))):
        with BuildLine():
            ThreePointArc((5.715, 1.4279316793), (6.6130256121, 1.0559572914), (6.985, 0.1579316793))
            Line((6.985, 0.1579316793), (6.985, 1.4279316793))
            Line((6.985, 1.4279316793), (5.715, 1.4279316793))
        make_face()
    extrude(amount=F2_T76_DEPTH)

    # F2_s77 → F2_t78 (intersect, symmetric)
    with BuildSketch(Plane.XY.offset(6.4)):
        Circle(F2_S77_R)
    extrude(amount=F2_T78_DEPTH, both=True, mode=Mode.INTERSECT)


with BuildPart() as f2_tool79:
    # F2_s80 → F2_t81 (revolve)
    with BuildSketch(Plane(origin=(0, 0, 0), x_dir=(0, 0, 1), z_dir=(0.9170952167, 0.3986682375, 0))):
        with BuildLine():
            ThreePointArc((5.715, -15.3732097417), (6.6130256121, -15.0012353538), (6.985, -14.1032097417))
            Line((6.985, -14.1032097417), (6.985, -15.3732097417))
            Line((6.985, -15.3732097417), (5.715, -15.3732097417))
        make_face()
    revolve(axis=Axis((0, 0, 6.985), (0, 0, 1)), revolution_arc=F2_T81_ANGLE)

    split(bisect_by=Plane(origin=(-1.2366251091, -0.7139658396, 0), x_dir=(0, 0, 1), z_dir=(0.8660254038, 0.5, 0)), keep=Keep.TOP)


with BuildPart() as f2_tool74_1:
    add(f2_tool74.part)

    # F2_t83: intersect F2_tool79
    add(f2_tool79.part, mode=Mode.INTERSECT)


with BuildPart() as f2_tool85:
    # F2_s86 → F2_t87 (new body)
    with BuildSketch(Plane(origin=(6.0658748909, 10.5064035033, 0), x_dir=(0, 0, 1), z_dir=(0.5, 0.8660254038, 0))):
        with BuildLine():
            ThreePointArc((5.715, 1.4279316793), (6.6130256121, 1.0559572914), (6.985, 0.1579316793))
            Line((6.985, 0.1579316793), (6.985, 1.4279316793))
            Line((6.985, 1.4279316793), (5.715, 1.4279316793))
        make_face()
    extrude(amount=F2_T87_DEPTH)

    # F2_s88 → F2_t89 (intersect, symmetric)
    with BuildSketch(Plane.XY.offset(6.4)):
        Circle(F2_S88_R)
    extrude(amount=F2_T89_DEPTH, both=True, mode=Mode.INTERSECT)


with BuildPart() as f2_tool90:
    # F2_s91 → F2_t92 (revolve)
    with BuildSketch(Plane(origin=(0, 0, 0), x_dir=(0, 0, 1), z_dir=(-0.113290787, -0.9935618741, 0))):
        with BuildLine():
            ThreePointArc((5.715, -15.3732097417), (6.6130256121, -15.0012353538), (6.985, -14.1032097417))
            Line((6.985, -14.1032097417), (6.985, -15.3732097417))
            Line((6.985, -15.3732097417), (5.715, -15.3732097417))
        make_face()
    revolve(axis=Axis((0, 0, 6.985), (0, 0, 1)), revolution_arc=F2_T92_ANGLE)

    split(bisect_by=Plane(origin=(1.2366251091, -0.7139658396, 0), x_dir=(0, 0, 1), z_dir=(-0.8660254038, 0.5, 0)), keep=Keep.TOP)


with BuildPart() as f2_tool85_1:
    add(f2_tool85.part)

    # F2_t94: intersect F2_tool90
    add(f2_tool90.part, mode=Mode.INTERSECT)


with BuildPart() as f2_tool96:
    # F2_s97 → F2_t98 (new body)
    with BuildSketch(Plane.YZ.offset(36.2617497817)):
        with BuildLine():
            ThreePointArc((1.4279316793, 5.715), (1.0559572914, 6.6130256121), (0.1579316793, 6.985))
            Line((0.1579316793, 6.985), (1.4279316793, 6.985))
            Line((1.4279316793, 6.985), (1.4279316793, 5.715))
        make_face()
    extrude(amount=-F2_T98_DEPTH)

    # F2_s99 → F2_t100 (intersect, symmetric)
    with BuildSketch(Plane.XY.offset(6.4)):
        Circle(F2_S99_R)
    extrude(amount=F2_T100_DEPTH, both=True, mode=Mode.INTERSECT)


with BuildPart() as f2_tool101:
    # F2_s102 → F2_t103 (revolve)
    with BuildSketch(Plane(origin=(0, 0, 0), x_dir=(0, 0, 1), z_dir=(-0.113290787, -0.9935618741, 0))):
        with BuildLine():
            ThreePointArc((5.715, -15.3732097417), (6.6130256121, -15.0012353538), (6.985, -14.1032097417))
            Line((6.985, -14.1032097417), (6.985, -15.3732097417))
            Line((6.985, -15.3732097417), (5.715, -15.3732097417))
        make_face()
    revolve(axis=Axis((0, 0, 6.985), (0, 0, 1)), revolution_arc=F2_T103_ANGLE)

    split(bisect_by=Plane.XZ.offset(-1.4279316793), keep=Keep.TOP)


with BuildPart() as f2_tool96_1:
    add(f2_tool96.part)

    # F2_t105: intersect F2_tool101
    add(f2_tool101.part, mode=Mode.INTERSECT)


with BuildPart() as f2_tool107:
    # F2_s108 → F2_t109 (revolve)
    with BuildSketch(Plane(origin=(0, 0, 0), x_dir=(0, 0, 1), z_dir=(0.9170952167, 0.3986682375, 0))):
        with BuildLine():
            ThreePointArc((5.715, -15.3732097417), (6.6130256121, -15.0012353538), (6.985, -14.1032097417))
            Line((6.985, -14.1032097417), (6.985, -15.3732097417))
            Line((6.985, -15.3732097417), (5.715, -15.3732097417))
        make_face()
    revolve(axis=Axis((0, 0, 6.985), (0, 0, 1)), revolution_arc=F2_T109_ANGLE)

    split(bisect_by=Plane.XZ.offset(-1.4279316793), keep=Keep.TOP)


with BuildPart() as f2_tool111:
    # F2_s112 → F2_t113 (new body)
    with BuildSketch(Plane.YZ.offset(-12.1317497817)):
        with BuildLine():
            ThreePointArc((1.4279316793, 5.715), (1.0559572914, 6.6130256121), (0.1579316793, 6.985))
            Line((0.1579316793, 6.985), (1.4279316793, 6.985))
            Line((1.4279316793, 6.985), (1.4279316793, 5.715))
        make_face()
    extrude(amount=-F2_T113_DEPTH)

    # F2_s114 → F2_t115 (intersect, symmetric)
    with BuildSketch(Plane.XY.offset(6.4)):
        Circle(F2_S114_R)
    extrude(amount=F2_T115_DEPTH, both=True, mode=Mode.INTERSECT)


with BuildPart() as f2_tool107_1:
    add(f2_tool107.part)

    # F2_t116: intersect F2_tool111
    add(f2_tool111.part, mode=Mode.INTERSECT)


with BuildPart() as f2_tool118:
    # F2_s119 → F2_t120 (new body)
    with BuildSketch(Plane(origin=(-18.1308748909, -31.4035964967, 0), x_dir=(0, 0, 1), z_dir=(0.5, 0.8660254038, 0))):
        with BuildLine():
            ThreePointArc((5.715, 1.4279316793), (6.6130256121, 1.0559572914), (6.985, 0.1579316793))
            Line((6.985, 0.1579316793), (6.985, 1.4279316793))
            Line((6.985, 1.4279316793), (5.715, 1.4279316793))
        make_face()
    extrude(amount=F2_T120_DEPTH)

    # F2_s121 → F2_t122 (intersect, symmetric)
    with BuildSketch(Plane.XY.offset(6.4)):
        Circle(F2_S121_R)
    extrude(amount=F2_T122_DEPTH, both=True, mode=Mode.INTERSECT)


with BuildPart() as f2_tool123:
    # F2_s124 → F2_t125 (revolve)
    with BuildSketch(Plane(origin=(0, 0, 0), x_dir=(0, 0, 1), z_dir=(-0.8038044297, 0.5948936366, 0))):
        with BuildLine():
            ThreePointArc((5.715, -15.3732097417), (6.6130256121, -15.0012353538), (6.985, -14.1032097417))
            Line((6.985, -14.1032097417), (6.985, -15.3732097417))
            Line((6.985, -15.3732097417), (5.715, -15.3732097417))
        make_face()
    revolve(axis=Axis((0, 0, 6.985), (0, 0, 1)), revolution_arc=F2_T125_ANGLE)

    split(bisect_by=Plane(origin=(1.2366251091, -0.7139658396, 0), x_dir=(0, 0, 1), z_dir=(-0.8660254038, 0.5, 0)), keep=Keep.TOP)


with BuildPart() as f2_tool118_1:
    add(f2_tool118.part)

    # F2_t127: intersect F2_tool123
    add(f2_tool123.part, mode=Mode.INTERSECT)


with BuildPart() as f2_tool129:
    # F2_s130 → F2_t131 (revolve)
    with BuildSketch(Plane(origin=(0, 0, 0), x_dir=(0, 0, 1), z_dir=(-0.8038044297, 0.5948936366, 0))):
        with BuildLine():
            ThreePointArc((5.715, -15.3732097417), (6.6130256121, -15.0012353538), (6.985, -14.1032097417))
            Line((6.985, -14.1032097417), (6.985, -15.3732097417))
            Line((6.985, -15.3732097417), (5.715, -15.3732097417))
        make_face()
    revolve(axis=Axis((0, 0, 6.985), (0, 0, 1)), revolution_arc=F2_T131_ANGLE)

    split(bisect_by=Plane(origin=(-1.2366251091, -0.7139658396, 0), x_dir=(0, 0, 1), z_dir=(0.8660254038, 0.5, 0)), keep=Keep.TOP)


with BuildPart() as f2_tool133:
    # F2_s134 → F2_t135 (new body)
    with BuildSketch(Plane(origin=(6.0658748909, -10.5064035033, 0), x_dir=(0, 0, 1), z_dir=(0.5, -0.8660254038, 0))):
        with BuildLine():
            ThreePointArc((5.715, 1.4279316793), (6.6130256121, 1.0559572914), (6.985, 0.1579316793))
            Line((6.985, 0.1579316793), (6.985, 1.4279316793))
            Line((6.985, 1.4279316793), (5.715, 1.4279316793))
        make_face()
    extrude(amount=F2_T135_DEPTH)

    # F2_s136 → F2_t137 (intersect, symmetric)
    with BuildSketch(Plane.XY.offset(6.4)):
        Circle(F2_S136_R)
    extrude(amount=F2_T137_DEPTH, both=True, mode=Mode.INTERSECT)


with BuildPart() as f2_tool129_1:
    add(f2_tool129.part)

    # F2_t138: intersect F2_tool133
    add(f2_tool133.part, mode=Mode.INTERSECT)


with BuildPart() as f1_1:
    add(f1.part)

    # F2_t139: cut F2_tool1, F2_tool6, F2_tool9, F2_tool12, F2_tool15, F2_tool20, F2_tool25, F2_tool30, F2_tool35, F2_tool38, F2_tool41, F2_tool44, F2_tool49, F2_tool54, F2_tool57, F2_tool60, F2_tool63, F2_tool68, F2_tool74, F2_tool85, F2_tool96, F2_tool107, F2_tool118, F2_tool129
    add([f2_tool1.part, f2_tool6.part, f2_tool9.part, f2_tool12.part, f2_tool15.part, f2_tool20.part, f2_tool25.part, f2_tool30.part, f2_tool35.part, f2_tool38.part, f2_tool41.part, f2_tool44.part, f2_tool49.part, f2_tool54.part, f2_tool57.part, f2_tool60.part, f2_tool63.part, f2_tool68.part, f2_tool74_1.part, f2_tool85_1.part, f2_tool96_1.part, f2_tool107_1.part, f2_tool118_1.part, f2_tool129_1.part], mode=Mode.SUBTRACT)

    # F3
    f3_edges = [f1_1.edges().sort_by_distance(p)[0] for p in [
        (-24.19675, -29.367932, 0),
        (-10.86175, -21.668966, 0),
        (-37.53175, -21.668966, 0),
        (-37.53175, -6.271034, 0),
        (-24.19675, 1.427932, 0),
        (-13.31359, 7.686605, 0),
        (-13.335, 20.241034, 0),
        (-13.335, 35.638966, 0),
        (0, 43.337932, 0),
        (13.335, 35.638966, 0),
        (13.335, 20.241034, 0),
        (13.31359, 7.686605, 0),
        (24.19675, 1.427932, 0),
        (37.53175, -6.271034, 0),
        (37.53175, -21.668966, 0),
        (24.19675, -29.367932, 0),
        (10.86175, -21.668966, 0),
        (0, -15.37321, 0),
    ]]
    fillet(f3_edges, radius=F3_R)


solid = f1_1.part
